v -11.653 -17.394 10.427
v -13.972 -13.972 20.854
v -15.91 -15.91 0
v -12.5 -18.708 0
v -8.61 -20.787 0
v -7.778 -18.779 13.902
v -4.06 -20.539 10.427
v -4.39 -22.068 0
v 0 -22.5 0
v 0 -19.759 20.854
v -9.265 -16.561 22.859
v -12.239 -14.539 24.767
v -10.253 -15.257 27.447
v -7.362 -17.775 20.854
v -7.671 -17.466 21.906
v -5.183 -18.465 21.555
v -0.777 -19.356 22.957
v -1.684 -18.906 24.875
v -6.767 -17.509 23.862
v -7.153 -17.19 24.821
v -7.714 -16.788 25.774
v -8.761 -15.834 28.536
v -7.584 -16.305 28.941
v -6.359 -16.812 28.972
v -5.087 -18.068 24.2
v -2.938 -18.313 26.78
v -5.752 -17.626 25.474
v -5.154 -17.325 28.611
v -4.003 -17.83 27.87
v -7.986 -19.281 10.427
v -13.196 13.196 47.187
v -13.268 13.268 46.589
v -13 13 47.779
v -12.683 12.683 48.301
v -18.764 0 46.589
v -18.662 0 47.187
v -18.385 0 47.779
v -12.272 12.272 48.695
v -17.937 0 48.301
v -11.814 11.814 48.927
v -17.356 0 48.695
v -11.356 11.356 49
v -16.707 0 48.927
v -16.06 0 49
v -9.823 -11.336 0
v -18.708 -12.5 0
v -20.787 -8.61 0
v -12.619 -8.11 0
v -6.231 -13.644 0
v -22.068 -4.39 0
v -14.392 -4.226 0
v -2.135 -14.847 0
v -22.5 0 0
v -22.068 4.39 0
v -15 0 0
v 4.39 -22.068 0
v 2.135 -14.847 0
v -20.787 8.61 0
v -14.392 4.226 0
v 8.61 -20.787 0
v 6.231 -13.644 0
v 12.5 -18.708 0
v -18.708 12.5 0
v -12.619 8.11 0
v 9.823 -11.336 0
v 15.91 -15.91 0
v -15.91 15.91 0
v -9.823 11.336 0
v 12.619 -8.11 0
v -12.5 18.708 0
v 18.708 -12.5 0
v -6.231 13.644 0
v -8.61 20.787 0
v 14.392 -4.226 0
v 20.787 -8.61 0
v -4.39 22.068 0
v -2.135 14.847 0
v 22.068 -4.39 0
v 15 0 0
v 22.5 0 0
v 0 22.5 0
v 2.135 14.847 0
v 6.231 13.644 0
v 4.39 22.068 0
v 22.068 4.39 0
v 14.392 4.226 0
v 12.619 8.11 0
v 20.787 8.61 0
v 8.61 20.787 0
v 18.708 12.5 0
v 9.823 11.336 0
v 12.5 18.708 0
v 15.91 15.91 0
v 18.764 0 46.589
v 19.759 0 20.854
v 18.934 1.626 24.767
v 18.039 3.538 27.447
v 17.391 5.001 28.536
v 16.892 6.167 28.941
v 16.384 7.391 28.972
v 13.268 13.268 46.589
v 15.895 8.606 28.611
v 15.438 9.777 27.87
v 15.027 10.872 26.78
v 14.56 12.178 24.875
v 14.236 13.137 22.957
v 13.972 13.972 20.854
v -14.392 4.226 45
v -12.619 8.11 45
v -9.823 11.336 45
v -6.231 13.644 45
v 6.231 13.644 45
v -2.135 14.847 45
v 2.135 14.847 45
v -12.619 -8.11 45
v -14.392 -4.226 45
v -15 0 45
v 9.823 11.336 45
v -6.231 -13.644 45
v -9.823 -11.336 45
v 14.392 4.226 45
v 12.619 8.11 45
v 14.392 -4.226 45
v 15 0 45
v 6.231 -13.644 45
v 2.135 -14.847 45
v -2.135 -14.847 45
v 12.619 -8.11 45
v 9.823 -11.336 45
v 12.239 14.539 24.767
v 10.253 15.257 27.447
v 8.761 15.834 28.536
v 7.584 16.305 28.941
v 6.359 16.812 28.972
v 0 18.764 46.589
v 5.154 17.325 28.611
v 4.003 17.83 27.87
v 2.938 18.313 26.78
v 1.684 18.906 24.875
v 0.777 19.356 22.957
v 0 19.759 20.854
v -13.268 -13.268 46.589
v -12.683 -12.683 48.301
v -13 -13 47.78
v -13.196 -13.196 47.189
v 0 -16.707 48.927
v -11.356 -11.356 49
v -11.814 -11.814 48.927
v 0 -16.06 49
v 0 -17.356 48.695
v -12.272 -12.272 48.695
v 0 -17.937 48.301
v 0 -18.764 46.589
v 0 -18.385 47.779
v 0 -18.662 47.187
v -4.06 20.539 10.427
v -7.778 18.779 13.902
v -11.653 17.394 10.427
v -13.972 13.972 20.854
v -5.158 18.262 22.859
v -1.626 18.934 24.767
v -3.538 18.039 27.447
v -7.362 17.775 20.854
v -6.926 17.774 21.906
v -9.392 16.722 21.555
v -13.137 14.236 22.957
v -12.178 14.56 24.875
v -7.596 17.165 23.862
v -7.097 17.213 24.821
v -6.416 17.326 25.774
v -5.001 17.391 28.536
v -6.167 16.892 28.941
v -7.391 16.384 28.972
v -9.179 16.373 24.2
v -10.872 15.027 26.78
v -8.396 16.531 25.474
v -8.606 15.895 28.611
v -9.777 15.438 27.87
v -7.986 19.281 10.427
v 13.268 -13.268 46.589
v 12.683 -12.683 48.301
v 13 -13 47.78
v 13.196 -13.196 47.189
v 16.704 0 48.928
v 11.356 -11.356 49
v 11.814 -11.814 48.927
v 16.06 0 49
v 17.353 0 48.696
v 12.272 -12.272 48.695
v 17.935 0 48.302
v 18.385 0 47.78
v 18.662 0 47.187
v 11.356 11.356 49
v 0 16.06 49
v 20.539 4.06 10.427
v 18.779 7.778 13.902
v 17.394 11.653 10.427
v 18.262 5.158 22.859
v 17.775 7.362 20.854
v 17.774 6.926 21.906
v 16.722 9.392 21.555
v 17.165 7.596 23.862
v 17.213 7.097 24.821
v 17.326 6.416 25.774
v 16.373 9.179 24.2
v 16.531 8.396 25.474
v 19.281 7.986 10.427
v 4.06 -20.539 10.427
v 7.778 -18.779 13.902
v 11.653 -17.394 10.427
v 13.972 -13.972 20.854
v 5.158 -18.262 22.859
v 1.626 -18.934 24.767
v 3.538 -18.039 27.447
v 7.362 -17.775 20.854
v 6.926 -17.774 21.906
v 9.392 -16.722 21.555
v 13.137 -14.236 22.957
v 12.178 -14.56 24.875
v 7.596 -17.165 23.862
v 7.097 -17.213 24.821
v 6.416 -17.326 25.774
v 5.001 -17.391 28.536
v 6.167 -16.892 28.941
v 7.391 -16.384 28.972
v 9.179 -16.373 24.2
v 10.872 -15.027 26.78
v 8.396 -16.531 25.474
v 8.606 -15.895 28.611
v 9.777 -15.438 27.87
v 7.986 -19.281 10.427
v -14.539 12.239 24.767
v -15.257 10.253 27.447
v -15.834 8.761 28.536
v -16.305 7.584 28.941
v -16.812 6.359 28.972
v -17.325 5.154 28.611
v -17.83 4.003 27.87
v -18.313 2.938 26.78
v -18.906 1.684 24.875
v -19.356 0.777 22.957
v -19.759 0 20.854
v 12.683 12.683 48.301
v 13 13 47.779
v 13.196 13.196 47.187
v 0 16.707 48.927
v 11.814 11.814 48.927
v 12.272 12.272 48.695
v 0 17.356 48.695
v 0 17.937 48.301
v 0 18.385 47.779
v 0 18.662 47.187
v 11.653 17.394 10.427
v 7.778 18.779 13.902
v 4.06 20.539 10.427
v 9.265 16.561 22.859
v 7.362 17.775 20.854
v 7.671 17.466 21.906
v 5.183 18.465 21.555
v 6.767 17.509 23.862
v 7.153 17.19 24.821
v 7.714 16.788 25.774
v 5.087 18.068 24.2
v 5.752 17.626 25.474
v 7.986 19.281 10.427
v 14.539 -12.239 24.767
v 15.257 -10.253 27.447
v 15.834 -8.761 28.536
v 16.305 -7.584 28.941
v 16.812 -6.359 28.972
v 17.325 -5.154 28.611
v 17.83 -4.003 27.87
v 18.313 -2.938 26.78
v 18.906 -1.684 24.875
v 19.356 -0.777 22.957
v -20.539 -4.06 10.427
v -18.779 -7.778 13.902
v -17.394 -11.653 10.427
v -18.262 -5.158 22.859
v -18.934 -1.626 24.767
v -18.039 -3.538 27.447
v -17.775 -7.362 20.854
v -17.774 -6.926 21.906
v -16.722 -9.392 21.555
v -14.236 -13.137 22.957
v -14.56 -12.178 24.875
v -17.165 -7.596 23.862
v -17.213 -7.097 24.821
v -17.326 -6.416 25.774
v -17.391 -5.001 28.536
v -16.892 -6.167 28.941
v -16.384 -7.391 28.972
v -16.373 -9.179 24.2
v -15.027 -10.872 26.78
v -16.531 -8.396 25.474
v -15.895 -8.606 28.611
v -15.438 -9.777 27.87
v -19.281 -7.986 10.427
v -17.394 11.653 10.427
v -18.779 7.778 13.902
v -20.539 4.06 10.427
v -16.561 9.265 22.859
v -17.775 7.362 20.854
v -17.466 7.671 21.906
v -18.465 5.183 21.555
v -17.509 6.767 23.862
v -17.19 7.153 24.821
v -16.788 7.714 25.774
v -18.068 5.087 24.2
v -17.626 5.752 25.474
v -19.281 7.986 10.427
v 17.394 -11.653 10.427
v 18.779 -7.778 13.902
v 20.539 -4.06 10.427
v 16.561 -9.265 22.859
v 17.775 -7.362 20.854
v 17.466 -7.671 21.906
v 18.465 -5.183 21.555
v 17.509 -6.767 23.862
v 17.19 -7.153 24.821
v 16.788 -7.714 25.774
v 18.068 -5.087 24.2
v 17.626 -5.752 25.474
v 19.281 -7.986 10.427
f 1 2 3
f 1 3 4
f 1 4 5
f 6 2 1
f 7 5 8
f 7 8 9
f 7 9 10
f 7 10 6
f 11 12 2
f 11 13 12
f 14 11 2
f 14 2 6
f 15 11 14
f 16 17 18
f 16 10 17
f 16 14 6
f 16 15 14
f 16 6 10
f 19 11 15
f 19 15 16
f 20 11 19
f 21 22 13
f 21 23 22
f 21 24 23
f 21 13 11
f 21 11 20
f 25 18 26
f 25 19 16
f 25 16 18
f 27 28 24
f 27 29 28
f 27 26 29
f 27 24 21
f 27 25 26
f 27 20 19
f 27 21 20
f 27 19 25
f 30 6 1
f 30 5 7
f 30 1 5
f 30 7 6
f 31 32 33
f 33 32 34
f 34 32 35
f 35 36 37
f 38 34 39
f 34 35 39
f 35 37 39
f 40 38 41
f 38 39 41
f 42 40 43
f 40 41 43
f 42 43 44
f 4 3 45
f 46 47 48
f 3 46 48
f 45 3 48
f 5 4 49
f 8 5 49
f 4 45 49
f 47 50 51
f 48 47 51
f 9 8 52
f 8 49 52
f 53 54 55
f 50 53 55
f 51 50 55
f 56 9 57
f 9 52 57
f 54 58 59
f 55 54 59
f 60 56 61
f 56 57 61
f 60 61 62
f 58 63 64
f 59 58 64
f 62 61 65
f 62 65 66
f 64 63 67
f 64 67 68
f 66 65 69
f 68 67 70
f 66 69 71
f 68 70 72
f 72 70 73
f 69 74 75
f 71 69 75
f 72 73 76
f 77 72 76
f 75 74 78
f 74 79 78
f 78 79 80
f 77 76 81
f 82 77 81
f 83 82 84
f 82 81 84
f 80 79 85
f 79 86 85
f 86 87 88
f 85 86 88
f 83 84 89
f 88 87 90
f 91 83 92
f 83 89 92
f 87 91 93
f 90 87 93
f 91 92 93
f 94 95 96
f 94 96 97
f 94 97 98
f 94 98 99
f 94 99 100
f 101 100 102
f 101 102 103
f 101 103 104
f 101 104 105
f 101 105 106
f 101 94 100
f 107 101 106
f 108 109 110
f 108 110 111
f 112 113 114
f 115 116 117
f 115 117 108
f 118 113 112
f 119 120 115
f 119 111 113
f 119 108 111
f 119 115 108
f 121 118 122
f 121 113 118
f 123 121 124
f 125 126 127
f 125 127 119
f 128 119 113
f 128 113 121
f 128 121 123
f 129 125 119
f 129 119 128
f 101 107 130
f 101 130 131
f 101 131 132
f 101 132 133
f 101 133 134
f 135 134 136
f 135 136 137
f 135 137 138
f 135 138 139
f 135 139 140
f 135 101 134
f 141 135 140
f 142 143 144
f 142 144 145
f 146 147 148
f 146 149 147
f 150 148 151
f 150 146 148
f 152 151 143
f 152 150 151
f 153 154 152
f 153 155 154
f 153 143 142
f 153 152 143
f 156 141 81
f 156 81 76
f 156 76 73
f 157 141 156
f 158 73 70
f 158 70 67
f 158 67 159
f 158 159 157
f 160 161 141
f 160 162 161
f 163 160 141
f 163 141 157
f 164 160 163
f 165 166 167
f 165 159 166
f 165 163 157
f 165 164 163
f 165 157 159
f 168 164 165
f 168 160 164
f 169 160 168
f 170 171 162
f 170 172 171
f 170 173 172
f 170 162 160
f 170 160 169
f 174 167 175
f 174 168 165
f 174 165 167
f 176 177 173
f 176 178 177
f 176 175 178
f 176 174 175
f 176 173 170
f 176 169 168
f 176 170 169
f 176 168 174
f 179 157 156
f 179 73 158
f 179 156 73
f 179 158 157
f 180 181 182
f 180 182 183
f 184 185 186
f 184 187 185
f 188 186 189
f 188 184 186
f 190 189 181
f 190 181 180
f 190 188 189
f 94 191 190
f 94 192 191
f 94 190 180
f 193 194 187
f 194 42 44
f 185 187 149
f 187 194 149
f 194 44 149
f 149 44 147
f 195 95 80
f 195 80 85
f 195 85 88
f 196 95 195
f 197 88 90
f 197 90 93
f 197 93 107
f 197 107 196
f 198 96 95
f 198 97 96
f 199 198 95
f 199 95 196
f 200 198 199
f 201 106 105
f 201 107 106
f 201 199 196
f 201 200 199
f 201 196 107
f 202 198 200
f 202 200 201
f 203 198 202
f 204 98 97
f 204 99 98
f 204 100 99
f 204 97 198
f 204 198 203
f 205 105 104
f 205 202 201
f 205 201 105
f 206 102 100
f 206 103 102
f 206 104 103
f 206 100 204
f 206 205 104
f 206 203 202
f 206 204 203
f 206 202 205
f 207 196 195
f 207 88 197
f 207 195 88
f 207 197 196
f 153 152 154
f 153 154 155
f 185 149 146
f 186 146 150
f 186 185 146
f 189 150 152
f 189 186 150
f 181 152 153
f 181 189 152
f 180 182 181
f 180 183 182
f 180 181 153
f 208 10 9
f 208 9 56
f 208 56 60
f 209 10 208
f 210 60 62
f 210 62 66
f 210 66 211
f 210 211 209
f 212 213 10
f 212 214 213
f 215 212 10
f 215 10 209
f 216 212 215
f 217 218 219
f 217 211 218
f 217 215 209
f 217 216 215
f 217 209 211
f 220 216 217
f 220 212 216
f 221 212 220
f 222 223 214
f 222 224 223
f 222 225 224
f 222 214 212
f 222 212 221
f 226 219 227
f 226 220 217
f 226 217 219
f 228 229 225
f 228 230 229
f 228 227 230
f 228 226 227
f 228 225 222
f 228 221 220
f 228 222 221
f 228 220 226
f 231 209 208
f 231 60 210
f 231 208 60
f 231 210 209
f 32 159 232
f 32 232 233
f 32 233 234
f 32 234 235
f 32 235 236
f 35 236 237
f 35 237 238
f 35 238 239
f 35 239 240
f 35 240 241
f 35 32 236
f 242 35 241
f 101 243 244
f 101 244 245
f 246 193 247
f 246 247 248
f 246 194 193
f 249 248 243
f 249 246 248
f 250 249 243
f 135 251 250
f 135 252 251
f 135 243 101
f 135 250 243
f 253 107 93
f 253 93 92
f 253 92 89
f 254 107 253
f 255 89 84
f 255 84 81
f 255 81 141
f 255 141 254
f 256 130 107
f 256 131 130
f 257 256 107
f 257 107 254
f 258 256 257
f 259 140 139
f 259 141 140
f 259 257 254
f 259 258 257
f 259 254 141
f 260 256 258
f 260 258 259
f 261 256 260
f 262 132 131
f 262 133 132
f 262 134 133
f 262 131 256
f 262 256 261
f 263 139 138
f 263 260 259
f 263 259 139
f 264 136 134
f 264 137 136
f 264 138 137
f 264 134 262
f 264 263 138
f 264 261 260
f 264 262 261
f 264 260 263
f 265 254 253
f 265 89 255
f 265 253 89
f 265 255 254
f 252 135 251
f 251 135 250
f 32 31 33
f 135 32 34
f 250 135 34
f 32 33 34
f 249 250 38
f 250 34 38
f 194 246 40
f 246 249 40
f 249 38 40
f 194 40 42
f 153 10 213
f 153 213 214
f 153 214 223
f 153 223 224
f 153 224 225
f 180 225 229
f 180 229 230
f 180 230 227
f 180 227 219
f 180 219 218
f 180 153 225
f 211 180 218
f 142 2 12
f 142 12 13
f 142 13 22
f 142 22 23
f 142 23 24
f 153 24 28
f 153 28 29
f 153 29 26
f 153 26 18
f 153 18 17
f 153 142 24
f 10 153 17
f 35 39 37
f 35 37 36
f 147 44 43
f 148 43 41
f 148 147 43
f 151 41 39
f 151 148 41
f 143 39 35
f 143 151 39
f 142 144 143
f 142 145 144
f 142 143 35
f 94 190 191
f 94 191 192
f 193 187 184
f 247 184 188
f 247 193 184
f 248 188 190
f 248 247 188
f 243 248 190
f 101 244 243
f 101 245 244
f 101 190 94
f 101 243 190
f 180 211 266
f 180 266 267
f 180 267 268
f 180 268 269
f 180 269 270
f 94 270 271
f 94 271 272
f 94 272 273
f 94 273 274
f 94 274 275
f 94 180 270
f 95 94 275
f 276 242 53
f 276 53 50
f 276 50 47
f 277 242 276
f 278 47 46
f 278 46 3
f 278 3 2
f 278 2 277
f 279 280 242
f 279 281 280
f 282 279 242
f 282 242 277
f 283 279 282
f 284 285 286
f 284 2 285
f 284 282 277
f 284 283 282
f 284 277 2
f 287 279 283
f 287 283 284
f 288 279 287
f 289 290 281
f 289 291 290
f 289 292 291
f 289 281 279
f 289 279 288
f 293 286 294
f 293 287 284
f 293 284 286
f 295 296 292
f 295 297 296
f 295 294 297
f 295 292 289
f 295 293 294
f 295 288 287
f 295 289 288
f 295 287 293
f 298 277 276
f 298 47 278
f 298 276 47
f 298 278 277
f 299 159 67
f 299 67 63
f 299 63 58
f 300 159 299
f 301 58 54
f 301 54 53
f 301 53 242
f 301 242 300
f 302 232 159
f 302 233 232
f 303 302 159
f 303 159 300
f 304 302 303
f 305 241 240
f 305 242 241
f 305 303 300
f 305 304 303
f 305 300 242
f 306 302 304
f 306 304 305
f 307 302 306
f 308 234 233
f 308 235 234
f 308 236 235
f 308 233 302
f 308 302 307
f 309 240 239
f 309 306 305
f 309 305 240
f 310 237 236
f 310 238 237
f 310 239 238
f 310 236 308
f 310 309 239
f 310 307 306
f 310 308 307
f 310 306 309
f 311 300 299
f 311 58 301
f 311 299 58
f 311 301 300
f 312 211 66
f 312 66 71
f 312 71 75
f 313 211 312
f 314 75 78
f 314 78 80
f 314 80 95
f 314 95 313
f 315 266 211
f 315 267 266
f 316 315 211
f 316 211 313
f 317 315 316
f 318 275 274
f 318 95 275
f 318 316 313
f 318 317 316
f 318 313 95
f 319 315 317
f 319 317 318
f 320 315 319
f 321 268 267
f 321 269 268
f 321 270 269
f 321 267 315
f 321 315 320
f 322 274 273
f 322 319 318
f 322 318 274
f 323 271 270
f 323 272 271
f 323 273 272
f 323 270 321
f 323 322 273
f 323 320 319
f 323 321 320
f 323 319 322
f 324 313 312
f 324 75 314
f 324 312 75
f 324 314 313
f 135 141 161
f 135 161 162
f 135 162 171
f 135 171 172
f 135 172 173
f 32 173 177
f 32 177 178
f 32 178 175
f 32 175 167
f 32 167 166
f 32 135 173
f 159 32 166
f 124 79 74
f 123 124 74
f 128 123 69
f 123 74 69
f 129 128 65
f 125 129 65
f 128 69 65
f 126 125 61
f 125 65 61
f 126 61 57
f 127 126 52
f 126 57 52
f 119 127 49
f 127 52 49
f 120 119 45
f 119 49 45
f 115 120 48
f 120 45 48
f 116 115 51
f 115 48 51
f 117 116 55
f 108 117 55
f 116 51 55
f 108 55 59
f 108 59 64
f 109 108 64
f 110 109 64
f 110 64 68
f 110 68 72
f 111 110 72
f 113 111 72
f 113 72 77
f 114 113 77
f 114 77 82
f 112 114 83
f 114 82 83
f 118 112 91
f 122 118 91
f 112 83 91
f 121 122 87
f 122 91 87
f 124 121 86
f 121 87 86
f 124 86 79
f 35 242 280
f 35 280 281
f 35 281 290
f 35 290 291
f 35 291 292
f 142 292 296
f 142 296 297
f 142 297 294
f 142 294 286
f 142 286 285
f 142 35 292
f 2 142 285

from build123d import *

# Parameters (mm, degrees)
F5_R      = 15
F7_R      = 13.25
F9_R      = 2.5
F10_R     = 22.5
F12_R     = 15
F13_DEPTH = 45


with BuildPart() as f4:
    # F1 (on Top) → F4 section 0
    with BuildSketch(Plane.XY):
        Polygon((0, 20.5654518056), (-14.5419704299, 14.5419704299), (-20.5654518056, 0), (-14.5419704299, -14.5419704299), (0, -20.5654518056), (14.5419704299, -14.5419704299), (20.5654518056, 0), (14.5419704299, 14.5419704299), align=None)
    # F3 (on offset) → F4 section 1
    with BuildSketch(Plane.XY.offset(49)):
        Polygon((0, 18.671265455), (-13.2025784166, 13.2025784166), (-18.671265455, 0), (-13.2025784166, -13.2025784166), (0, -18.671265455), (13.2025784166, -13.2025784166), (18.671265455, 0), (13.2025784166, 13.2025784166), align=None)
    loft()

    # F5 (on Top) → F8 section 0
    with BuildSketch(Plane.XY):
        Circle(F5_R)
    # F7 (on offset) → F8 section 1
    with BuildSketch(Plane.XY.offset(45)):
        Circle(F7_R)
    loft(mode=Mode.SUBTRACT)

    # F9
    f9_edges = [f4.edges().sort_by_distance(p)[0] for p in [
        (-15.936922, -6.601289, 49),
        (-6.601289, -15.936922, 49),
        (6.601289, -15.936922, 49),
        (15.936922, -6.601289, 49),
        (15.936922, 6.601289, 49),
        (6.601289, 15.936922, 49),
        (-6.601289, 15.936922, 49),
        (-15.936922, 6.601289, 49),
    ]]
    fillet(f9_edges, radius=F9_R)

    # F10 (on Top) → F11 section 0
    with BuildSketch(Plane.XY):
        Circle(F10_R)
    # F4_face (on face) → F11 section 1
    with BuildSketch(Plane.XY.offset(49)):
        with BuildLine():
            add(Edge.make_bspline(
                [(-16.0602019121, 0), (-13.7082397957, -5.6781388396), (-11.3562776793, -11.3562776793)],
                knots=[0.9992107587, 0.9992107587, 0.9992107587, 13.2911571431, 13.2911571431, 13.2911571431], degree=2))
            add(Edge.make_bspline(
                [(-11.3562776793, -11.3562776793), (-5.6781388396, -13.7082397957), (0, -16.0602019121)],
                knots=[0.9992107587, 0.9992107587, 0.9992107587, 13.2911571431, 13.2911571431, 13.2911571431], degree=2))
            add(Edge.make_bspline(
                [(0, -16.0602019121), (5.6781388396, -13.7082397957), (11.3562776793, -11.3562776793)],
                knots=[0.9992107587, 0.9992107587, 0.9992107587, 13.2911571431, 13.2911571431, 13.2911571431], degree=2))
            add(Edge.make_bspline(
                [(11.3562776793, -11.3562776793), (13.7082397957, -5.6781388396), (16.0602019121, 0)],
                knots=[0.9992107587, 0.9992107587, 0.9992107587, 13.2911571431, 13.2911571431, 13.2911571431], degree=2))
            add(Edge.make_bspline(
                [(16.0602019121, 0), (13.7082397957, 5.6781388396), (11.3562776793, 11.3562776793)],
                knots=[0.9992107587, 0.9992107587, 0.9992107587, 13.2911571431, 13.2911571431, 13.2911571431], degree=2))
            add(Edge.make_bspline(
                [(11.3562776793, 11.3562776793), (5.6781388396, 13.7082397957), (0, 16.0602019121)],
                knots=[0.9992107587, 0.9992107587, 0.9992107587, 13.2911571431, 13.2911571431, 13.2911571431], degree=2))
            add(Edge.make_bspline(
                [(0, 16.0602019121), (-5.6781388396, 13.7082397957), (-11.3562776793, 11.3562776793)],
                knots=[0.9992107587, 0.9992107587, 0.9992107587, 13.2911571431, 13.2911571431, 13.2911571431], degree=2))
            add(Edge.make_bspline(
                [(-11.3562776793, 11.3562776793), (-13.7082397957, 5.6781388396), (-16.0602019121, 0)],
                knots=[0.9992107587, 0.9992107587, 0.9992107587, 13.2911571431, 13.2911571431, 13.2911571431], degree=2))
        make_face()
    loft()

    # F12 (on face) → F13 (cut)
    with BuildSketch(Plane(origin=(0, 0, 0), x_dir=(1, 0, 0), z_dir=(0, 0, -1))):
        Circle(F12_R)
    extrude(amount=-F13_DEPTH, mode=Mode.SUBTRACT)


solid = f4.part
